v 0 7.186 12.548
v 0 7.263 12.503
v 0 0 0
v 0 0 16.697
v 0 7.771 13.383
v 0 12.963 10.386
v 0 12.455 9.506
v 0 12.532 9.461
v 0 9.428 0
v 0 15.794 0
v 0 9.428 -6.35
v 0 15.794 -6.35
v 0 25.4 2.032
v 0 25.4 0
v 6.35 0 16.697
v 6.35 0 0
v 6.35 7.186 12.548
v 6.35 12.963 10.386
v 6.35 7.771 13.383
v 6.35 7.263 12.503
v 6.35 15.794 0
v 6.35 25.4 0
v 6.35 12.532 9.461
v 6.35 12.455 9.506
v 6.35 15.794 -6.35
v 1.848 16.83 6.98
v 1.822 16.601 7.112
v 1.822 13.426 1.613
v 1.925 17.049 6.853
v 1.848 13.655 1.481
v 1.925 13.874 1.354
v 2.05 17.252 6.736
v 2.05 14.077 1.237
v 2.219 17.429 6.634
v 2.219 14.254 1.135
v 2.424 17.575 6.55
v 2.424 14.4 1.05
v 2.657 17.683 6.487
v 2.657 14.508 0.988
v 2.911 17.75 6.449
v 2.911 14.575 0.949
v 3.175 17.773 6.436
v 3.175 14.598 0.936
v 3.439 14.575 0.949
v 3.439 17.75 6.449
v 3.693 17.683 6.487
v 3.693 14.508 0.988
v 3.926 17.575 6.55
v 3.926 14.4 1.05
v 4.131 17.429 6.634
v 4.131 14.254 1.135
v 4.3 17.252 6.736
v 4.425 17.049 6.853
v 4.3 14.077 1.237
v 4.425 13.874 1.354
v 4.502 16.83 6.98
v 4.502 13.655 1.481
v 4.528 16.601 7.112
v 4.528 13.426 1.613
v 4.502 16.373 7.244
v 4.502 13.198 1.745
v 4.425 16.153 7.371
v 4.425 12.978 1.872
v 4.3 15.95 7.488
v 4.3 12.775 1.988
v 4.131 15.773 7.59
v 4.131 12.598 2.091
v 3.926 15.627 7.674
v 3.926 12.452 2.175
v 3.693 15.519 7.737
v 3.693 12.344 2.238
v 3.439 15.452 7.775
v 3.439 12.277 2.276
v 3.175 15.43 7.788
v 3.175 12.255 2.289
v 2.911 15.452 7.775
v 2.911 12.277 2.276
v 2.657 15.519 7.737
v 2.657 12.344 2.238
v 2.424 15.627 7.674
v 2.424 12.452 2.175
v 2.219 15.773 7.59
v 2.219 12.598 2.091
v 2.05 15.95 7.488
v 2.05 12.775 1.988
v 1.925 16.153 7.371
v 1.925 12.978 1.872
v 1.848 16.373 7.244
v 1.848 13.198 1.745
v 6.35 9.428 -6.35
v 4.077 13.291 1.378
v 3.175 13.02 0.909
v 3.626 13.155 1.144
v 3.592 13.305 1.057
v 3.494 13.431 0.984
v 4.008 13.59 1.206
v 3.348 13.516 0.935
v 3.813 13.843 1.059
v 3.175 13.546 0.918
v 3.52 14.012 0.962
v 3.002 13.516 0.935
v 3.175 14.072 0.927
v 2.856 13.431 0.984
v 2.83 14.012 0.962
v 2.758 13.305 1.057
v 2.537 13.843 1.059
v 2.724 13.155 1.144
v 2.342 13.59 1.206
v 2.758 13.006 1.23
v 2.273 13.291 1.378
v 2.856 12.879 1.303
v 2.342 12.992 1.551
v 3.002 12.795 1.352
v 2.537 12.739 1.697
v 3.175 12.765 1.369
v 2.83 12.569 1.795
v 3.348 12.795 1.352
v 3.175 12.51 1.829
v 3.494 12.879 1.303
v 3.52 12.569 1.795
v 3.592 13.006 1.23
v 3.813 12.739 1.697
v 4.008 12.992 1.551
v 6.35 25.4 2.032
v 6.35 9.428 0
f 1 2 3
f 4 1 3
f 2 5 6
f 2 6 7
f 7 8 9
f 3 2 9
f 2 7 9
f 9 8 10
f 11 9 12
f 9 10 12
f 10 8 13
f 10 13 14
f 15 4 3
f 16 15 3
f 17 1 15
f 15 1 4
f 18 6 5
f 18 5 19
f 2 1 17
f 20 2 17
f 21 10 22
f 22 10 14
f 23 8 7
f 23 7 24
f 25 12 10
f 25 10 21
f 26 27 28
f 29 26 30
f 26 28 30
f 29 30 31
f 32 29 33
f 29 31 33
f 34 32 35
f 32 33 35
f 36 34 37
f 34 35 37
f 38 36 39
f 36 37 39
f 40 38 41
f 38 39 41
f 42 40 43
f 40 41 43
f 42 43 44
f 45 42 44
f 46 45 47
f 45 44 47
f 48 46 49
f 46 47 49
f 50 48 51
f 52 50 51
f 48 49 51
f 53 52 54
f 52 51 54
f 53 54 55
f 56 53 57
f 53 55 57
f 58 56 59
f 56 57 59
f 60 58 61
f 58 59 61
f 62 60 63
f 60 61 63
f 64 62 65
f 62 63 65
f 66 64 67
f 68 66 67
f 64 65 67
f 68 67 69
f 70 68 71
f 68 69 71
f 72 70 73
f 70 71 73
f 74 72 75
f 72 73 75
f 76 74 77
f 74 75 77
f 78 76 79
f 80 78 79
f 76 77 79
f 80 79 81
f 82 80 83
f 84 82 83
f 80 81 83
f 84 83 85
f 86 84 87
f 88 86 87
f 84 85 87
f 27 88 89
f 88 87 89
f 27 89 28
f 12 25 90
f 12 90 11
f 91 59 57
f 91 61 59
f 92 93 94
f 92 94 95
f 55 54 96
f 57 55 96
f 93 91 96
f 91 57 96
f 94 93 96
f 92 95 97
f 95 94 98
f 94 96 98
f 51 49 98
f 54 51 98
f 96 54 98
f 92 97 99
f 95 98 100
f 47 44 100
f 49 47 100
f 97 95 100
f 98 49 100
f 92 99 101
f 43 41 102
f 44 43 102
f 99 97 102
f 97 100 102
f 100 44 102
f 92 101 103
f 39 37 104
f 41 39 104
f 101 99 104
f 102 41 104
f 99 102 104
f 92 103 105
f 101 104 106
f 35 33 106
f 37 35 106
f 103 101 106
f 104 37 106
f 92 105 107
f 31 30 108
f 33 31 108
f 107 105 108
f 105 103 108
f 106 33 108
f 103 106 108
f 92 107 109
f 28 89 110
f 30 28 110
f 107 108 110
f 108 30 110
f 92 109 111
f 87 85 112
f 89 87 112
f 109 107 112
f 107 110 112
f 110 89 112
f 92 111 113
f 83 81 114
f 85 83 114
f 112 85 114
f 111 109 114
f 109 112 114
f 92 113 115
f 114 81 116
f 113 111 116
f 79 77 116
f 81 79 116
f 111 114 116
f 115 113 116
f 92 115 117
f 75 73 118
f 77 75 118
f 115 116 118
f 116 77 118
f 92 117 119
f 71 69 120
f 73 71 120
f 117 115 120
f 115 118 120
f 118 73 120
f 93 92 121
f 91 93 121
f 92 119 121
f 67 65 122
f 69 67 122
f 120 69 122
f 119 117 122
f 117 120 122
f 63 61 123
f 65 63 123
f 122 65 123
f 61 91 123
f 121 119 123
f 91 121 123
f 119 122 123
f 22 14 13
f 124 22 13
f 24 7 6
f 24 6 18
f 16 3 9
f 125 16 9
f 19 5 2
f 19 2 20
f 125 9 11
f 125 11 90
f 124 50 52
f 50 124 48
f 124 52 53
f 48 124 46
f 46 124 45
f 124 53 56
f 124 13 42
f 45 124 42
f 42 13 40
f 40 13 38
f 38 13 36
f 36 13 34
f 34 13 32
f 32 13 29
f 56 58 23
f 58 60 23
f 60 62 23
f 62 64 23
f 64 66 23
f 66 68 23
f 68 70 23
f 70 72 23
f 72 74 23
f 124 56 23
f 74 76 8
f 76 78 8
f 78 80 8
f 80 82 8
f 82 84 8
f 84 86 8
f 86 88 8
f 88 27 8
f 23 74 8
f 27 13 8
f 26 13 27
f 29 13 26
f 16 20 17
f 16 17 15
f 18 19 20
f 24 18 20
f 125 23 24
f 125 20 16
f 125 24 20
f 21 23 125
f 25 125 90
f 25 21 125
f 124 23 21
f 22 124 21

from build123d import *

# Parameters (mm, degrees)
BOSS_EXTRUDE1_DEPTH           = 6.35
SKETCH2_W                     = 6.35
SKETCH2_H                     = 6.5278
BOSS_EXTRUDE2_DEPTH           = 6.35
SKETCH8_W                     = 6.35
SKETCH8_H                     = 6.1722
BOSS_EXTRUDE3_DEPTH           = 1.016
TAP_DRILL_FOR_6_32_TAP1_D     = 2.7051
TAP_DRILL_FOR_6_32_TAP1_DEPTH = 6.35
TAP_DRILL_FOR_6_32_TAP1_TIP   = 0.81269403
SKETCH12_W                    = 6.35
SKETCH12_H                    = 6.35
CUT_EXTRUDE2_DEPTH            = 0.08128
SKETCH13_W                    = 6.35
SKETCH13_H                    = 6.35
CUT_EXTRUDE3_DEPTH            = 0.08128
SKETCH14_W                    = 6.35
SKETCH14_H                    = 1.016
CUT_EXTRUDE4_DEPTH            = 0.0889
SKETCH15_W                    = 6.35
SKETCH15_H                    = 1.016
CUT_EXTRUDE5_DEPTH            = 0.0889


with BuildPart() as part:
    # Sketch1 → Boss-Extrude1 (new body)
    with BuildSketch(Plane(origin=(0, 0, 0), x_dir=(0, 0, -1), z_dir=(1, 0, 0))):
        Polygon((0, 0), (0, 25.4), (-2.032, 25.4), (-16.696696837, 0), align=None)
    extrude(amount=BOSS_EXTRUDE1_DEPTH)

    # Sketch2 → Boss-Extrude2 (add)
    with BuildSketch(Plane(origin=(0, 0, 0), x_dir=(-1, 0, 0), z_dir=(0, 0, -1))):
        with Locations((-3.175, 12.6111)):
            Rectangle(SKETCH2_W, SKETCH2_H)
    extrude(amount=BOSS_EXTRUDE2_DEPTH)

    # Sketch8 → Boss-Extrude3 (add)
    with BuildSketch(Plane(origin=(0, 7.22988181, 12.522522628), x_dir=(1, 0, 0), z_dir=(0, 0.49999999999999467, 0.8660254037844417))):
        with Locations((3.175, 3.035945256)):
            Rectangle(SKETCH8_W, SKETCH8_H)
    extrude(amount=BOSS_EXTRUDE3_DEPTH)

    # Tap Drill for #6-32 Tap1
    with Locations(Plane(origin=(0, 7.22988181, 12.522522628), x_dir=(1, 0, 0), z_dir=(0, 0.49999999999999467, 0.8660254037844417))):
        with Locations((3.175, 10.821045256)):
            Hole(TAP_DRILL_FOR_6_32_TAP1_D / 2, depth=TAP_DRILL_FOR_6_32_TAP1_DEPTH)
            with Locations((0, 0, -(TAP_DRILL_FOR_6_32_TAP1_DEPTH + TAP_DRILL_FOR_6_32_TAP1_TIP / 2))):  # 118° drill point
                Cone(0, TAP_DRILL_FOR_6_32_TAP1_D / 2, TAP_DRILL_FOR_6_32_TAP1_TIP, mode=Mode.SUBTRACT)

    # Sketch12 → Cut-Extrude2 (cut)
    with BuildSketch(Plane(origin=(0, 15.875, 0), x_dir=(1, 0, 0), z_dir=(0, 1, 0))):
        with Locations((3.175, 3.175)):
            Rectangle(SKETCH12_W, SKETCH12_H)
    extrude(amount=-CUT_EXTRUDE2_DEPTH, mode=Mode.SUBTRACT)

    # Sketch13 → Cut-Extrude3 (cut)
    with BuildSketch(Plane.XZ.offset(-9.3472)):
        with Locations((3.175, -3.175)):
            Rectangle(SKETCH13_W, SKETCH13_H)
    extrude(amount=-CUT_EXTRUDE3_DEPTH, mode=Mode.SUBTRACT)

    # Sketch14 → Cut-Extrude4 (cut)
    with BuildSketch(Plane(origin=(0, 5.301846715, -3.061022628), x_dir=(1, 0, 0), z_dir=(0, 0.8660254037844417, -0.49999999999999467))):
        with Locations((3.175, -14.96776362)):
            Rectangle(SKETCH14_W, SKETCH14_H)
    extrude(amount=-CUT_EXTRUDE4_DEPTH, mode=Mode.SUBTRACT)

    # Sketch15 → Cut-Extrude5 (cut)
    with BuildSketch(Plane(origin=(0, -0.043435282, 0.025077372), x_dir=(1, 0, 0), z_dir=(0, -0.8660254037844417, 0.49999999999999467))):
        with Locations((3.175, 14.96776362)):
            Rectangle(SKETCH15_W, SKETCH15_H)
    extrude(amount=-CUT_EXTRUDE5_DEPTH, mode=Mode.SUBTRACT)


solid = part.part
